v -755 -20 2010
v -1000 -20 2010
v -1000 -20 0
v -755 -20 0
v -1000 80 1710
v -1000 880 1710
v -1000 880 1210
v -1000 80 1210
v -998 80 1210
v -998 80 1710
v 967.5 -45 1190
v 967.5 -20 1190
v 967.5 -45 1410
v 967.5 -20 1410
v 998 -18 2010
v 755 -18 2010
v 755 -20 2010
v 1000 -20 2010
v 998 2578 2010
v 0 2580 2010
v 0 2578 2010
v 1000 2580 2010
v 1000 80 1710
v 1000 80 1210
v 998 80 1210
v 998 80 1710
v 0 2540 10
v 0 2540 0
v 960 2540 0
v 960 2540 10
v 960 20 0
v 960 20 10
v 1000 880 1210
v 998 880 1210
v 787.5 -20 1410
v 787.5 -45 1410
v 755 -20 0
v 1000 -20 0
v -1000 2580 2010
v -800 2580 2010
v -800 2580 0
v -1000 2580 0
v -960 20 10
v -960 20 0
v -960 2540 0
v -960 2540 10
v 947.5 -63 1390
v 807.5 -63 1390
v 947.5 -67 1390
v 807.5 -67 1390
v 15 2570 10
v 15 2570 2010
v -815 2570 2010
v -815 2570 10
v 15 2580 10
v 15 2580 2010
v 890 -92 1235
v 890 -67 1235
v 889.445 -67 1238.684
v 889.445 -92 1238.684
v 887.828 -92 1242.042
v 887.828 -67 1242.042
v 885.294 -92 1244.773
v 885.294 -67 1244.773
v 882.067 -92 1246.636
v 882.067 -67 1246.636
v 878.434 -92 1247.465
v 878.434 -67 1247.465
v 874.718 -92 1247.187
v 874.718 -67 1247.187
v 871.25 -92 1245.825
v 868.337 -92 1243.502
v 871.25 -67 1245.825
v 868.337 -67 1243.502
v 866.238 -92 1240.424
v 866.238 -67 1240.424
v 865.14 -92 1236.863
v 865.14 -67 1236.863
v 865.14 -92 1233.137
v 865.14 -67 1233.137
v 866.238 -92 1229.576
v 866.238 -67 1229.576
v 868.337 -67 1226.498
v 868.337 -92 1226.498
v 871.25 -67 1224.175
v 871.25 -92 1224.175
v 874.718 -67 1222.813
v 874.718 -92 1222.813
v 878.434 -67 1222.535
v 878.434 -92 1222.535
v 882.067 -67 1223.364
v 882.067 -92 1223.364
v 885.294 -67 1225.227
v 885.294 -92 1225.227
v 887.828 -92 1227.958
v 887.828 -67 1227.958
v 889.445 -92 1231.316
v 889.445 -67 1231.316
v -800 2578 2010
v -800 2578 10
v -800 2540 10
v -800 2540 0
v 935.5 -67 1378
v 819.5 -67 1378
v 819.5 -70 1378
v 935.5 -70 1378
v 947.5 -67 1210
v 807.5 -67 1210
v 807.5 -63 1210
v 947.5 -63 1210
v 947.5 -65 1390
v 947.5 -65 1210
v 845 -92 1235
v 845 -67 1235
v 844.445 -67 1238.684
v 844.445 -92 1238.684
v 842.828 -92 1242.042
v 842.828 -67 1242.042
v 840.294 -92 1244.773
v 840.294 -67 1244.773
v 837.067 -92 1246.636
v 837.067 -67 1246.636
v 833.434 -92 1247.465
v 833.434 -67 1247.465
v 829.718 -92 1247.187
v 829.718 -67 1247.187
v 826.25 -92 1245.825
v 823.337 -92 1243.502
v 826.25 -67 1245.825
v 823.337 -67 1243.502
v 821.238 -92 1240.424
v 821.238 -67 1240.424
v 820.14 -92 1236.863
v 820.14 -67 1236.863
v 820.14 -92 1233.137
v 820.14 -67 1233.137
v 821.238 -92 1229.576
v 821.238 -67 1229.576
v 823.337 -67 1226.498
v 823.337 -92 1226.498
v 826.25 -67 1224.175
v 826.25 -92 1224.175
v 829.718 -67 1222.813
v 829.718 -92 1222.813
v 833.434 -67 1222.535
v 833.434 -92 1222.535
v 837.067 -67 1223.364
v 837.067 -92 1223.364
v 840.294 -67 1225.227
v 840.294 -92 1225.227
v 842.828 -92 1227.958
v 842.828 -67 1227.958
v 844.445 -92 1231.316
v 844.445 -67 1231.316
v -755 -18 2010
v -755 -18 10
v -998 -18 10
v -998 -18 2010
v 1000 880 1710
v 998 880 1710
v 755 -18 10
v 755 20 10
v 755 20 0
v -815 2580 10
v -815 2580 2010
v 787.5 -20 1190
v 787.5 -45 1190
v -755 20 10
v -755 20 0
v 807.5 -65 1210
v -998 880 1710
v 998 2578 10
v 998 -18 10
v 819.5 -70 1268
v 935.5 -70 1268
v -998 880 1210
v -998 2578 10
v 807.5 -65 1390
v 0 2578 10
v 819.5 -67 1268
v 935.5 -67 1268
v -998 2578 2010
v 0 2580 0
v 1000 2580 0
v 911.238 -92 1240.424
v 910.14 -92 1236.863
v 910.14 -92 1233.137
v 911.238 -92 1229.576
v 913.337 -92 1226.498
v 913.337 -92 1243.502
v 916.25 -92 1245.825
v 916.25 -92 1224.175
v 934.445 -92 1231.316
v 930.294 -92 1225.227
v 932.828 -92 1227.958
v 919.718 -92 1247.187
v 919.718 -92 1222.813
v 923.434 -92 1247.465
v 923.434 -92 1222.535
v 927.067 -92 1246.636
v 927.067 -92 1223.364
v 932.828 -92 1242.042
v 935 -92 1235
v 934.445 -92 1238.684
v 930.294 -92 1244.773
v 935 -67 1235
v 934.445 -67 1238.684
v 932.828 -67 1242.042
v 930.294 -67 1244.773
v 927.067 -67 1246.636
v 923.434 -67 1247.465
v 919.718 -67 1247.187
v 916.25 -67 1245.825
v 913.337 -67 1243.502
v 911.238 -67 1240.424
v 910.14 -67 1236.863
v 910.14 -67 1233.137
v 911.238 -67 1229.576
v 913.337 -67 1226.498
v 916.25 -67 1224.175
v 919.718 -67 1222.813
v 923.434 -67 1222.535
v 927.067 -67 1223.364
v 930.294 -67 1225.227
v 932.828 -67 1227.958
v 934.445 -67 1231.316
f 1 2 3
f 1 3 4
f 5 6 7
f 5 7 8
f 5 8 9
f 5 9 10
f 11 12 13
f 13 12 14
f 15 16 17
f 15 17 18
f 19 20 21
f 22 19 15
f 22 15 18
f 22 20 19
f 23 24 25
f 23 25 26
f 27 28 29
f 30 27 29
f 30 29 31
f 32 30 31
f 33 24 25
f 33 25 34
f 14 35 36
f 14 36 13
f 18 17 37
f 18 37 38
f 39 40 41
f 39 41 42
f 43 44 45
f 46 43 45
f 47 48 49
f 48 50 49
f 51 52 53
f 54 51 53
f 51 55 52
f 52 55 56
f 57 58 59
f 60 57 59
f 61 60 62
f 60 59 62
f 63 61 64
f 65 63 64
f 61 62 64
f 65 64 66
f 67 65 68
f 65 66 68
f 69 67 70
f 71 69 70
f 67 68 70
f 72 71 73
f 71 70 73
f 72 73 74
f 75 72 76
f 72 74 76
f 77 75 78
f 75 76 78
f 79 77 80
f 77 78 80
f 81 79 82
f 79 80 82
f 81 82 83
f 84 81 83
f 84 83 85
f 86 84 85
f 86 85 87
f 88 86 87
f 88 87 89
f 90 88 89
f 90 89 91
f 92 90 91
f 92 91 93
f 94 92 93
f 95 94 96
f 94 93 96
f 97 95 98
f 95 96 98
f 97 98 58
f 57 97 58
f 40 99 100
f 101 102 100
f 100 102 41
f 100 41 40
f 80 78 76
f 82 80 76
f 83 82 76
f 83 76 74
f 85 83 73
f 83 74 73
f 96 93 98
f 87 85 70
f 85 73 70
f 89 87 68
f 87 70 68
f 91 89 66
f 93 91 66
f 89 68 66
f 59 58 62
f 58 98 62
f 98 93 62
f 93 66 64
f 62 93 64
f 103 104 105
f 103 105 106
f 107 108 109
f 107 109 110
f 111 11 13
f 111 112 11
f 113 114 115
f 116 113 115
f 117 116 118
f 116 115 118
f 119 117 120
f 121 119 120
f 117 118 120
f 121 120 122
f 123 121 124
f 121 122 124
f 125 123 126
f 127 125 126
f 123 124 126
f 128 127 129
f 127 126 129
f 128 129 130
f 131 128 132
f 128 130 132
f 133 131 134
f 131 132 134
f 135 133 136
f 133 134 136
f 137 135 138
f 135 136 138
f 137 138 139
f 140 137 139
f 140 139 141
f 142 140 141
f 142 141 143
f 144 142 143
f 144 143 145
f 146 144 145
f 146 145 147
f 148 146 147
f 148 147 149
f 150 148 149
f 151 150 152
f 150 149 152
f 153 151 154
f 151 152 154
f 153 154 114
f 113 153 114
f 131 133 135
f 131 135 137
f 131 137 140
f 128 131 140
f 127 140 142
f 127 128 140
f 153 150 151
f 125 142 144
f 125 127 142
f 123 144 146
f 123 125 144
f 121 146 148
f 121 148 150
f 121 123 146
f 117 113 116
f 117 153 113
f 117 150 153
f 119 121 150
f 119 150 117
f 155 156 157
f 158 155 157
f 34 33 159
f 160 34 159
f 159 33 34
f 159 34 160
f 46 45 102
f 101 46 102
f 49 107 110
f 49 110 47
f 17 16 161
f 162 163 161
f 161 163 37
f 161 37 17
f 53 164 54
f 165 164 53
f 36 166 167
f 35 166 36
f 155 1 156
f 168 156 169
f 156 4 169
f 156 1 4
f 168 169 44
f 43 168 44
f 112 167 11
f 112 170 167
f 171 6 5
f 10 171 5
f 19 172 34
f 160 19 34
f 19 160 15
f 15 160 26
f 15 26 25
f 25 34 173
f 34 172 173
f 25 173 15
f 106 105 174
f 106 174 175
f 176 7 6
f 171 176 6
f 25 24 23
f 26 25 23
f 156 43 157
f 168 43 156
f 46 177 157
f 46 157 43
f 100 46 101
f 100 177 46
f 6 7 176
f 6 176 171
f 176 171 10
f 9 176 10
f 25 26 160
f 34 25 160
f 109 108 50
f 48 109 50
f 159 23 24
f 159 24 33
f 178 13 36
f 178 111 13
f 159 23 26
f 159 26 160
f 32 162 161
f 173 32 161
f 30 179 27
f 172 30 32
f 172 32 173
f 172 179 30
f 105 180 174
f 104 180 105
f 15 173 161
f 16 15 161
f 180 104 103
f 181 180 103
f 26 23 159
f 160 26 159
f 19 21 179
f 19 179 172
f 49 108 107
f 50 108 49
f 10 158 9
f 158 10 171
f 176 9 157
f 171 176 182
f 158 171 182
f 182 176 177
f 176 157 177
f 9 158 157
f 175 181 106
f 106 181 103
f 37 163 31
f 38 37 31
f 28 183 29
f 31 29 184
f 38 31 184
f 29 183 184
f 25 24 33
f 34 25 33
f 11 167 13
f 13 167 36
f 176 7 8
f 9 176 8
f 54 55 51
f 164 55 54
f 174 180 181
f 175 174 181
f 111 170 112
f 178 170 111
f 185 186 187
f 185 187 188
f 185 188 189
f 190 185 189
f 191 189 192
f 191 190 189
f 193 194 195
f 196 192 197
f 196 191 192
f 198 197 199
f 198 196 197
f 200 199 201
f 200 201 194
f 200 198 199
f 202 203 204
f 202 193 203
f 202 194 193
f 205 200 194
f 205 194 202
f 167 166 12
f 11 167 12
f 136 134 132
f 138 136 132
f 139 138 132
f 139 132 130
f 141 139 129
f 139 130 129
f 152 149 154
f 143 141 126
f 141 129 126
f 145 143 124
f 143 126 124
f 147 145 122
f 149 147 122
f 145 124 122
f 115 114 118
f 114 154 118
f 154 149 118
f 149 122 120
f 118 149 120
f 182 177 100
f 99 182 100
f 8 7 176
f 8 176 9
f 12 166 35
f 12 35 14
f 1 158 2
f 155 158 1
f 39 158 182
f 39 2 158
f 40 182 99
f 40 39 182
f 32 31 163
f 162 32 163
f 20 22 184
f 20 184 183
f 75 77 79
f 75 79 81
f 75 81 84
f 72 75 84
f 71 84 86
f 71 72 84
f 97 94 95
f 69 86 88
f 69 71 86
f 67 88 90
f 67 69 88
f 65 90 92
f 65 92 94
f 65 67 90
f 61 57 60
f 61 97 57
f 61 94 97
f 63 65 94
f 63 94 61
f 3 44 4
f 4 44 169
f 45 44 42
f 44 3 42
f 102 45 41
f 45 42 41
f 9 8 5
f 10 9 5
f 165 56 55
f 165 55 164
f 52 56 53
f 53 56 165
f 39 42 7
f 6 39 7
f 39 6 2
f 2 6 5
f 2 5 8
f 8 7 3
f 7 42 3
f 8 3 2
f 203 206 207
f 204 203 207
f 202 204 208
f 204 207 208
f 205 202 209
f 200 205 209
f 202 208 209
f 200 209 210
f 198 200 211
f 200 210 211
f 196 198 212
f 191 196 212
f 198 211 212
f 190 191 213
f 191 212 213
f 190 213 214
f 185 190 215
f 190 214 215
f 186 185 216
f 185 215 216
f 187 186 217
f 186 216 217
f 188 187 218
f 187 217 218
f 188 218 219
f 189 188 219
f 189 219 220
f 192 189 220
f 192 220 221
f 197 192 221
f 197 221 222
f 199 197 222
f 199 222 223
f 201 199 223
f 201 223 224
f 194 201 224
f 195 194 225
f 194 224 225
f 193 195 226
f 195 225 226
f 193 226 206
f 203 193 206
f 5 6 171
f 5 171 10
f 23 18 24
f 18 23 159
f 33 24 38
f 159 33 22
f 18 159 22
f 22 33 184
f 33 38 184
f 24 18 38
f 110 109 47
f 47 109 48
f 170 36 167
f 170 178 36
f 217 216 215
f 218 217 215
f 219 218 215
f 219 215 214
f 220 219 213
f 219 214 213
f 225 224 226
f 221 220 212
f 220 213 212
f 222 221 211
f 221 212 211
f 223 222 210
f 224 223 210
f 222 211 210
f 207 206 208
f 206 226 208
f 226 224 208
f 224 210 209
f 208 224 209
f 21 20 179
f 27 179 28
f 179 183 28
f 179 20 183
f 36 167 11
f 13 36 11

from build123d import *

# Parameters (mm, degrees)
F1_DEPTH   = 10
F3_DEPTH   = 2000
F5_DEPTH   = 2000
F6_W       = 830
F6_H       = 2000
F7_DEPTH   = 10
F8_W       = 800
F8_H       = 500
F9_DEPTH   = 5
F10_W      = 800
F10_H      = 500
F11_DEPTH  = 5
F12_W      = 800
F12_H      = 500
F13_DEPTH  = 2
F14_W      = 800
F14_H      = 500
F15_DEPTH  = 2
F17_W      = 180
F17_H      = 220
F18_DEPTH  = 25
F18_FACE_W = 180
F18_FACE_H = 220
F20_W      = 140
F20_H      = 180
F22_DEPTH  = 2
F23_R      = 12.5
F24_DEPTH  = 25
F25_W      = 116
F25_H      = 110
F26_DEPTH  = 3


with BuildPart() as f1:
    # F0 (on Top) → F1 (new body)
    with BuildSketch(Plane.XY):
        Polygon((-755, -20), (-755, 0), (-755, 20), (-960, 20), (-960, 2540), (-800, 2540), (-800, 2580), (-1000, 2580), (-1000, 2540), (-1000, 20), (-1000, 0), (-1000, -20), align=None)
    extrude(amount=F1_DEPTH)

    # F2 (on face) → F3 (join)
    with BuildSketch(Plane.XY.offset(10)):
        Polygon((-800, 2578), (-800, 2580), (-1000, 2580), (-1000, -20), (-755, -20), (-755, -18), (-998, -18), (-998, 2578), align=None)
    extrude(amount=F3_DEPTH)

    # F10 (on face) → F11 (cut)
    with BuildSketch(Plane(origin=(-1000, 0, 0), x_dir=(0, -1, 0), z_dir=(-1, 0, 0))):
        with Locations((-480, 1460)):
            Rectangle(F10_W, F10_H)
    extrude(amount=-F11_DEPTH, mode=Mode.SUBTRACT)


with BuildPart() as f1b:
    # F0 (on Top) → F1, piece 2 (new body)
    with BuildSketch(Plane.XY):
        Polygon((755, 20), (755, 0), (755, -20), (1000, -20), (1000, 0), (1000, 20), (1000, 2540), (1000, 2580), (0, 2580), (0, 2540), (960, 2540), (960, 20), align=None)
    extrude(amount=F1_DEPTH)

    # F4 (on face) → F5 (join)
    with BuildSketch(Plane.XY.offset(10)):
        Polygon((1000, 2580), (0, 2580), (0, 2578), (998, 2578), (998, -18), (755, -18), (755, -20), (1000, -20), align=None)
    extrude(amount=F5_DEPTH)

    # F8 (on face) → F9 (cut)
    with BuildSketch(Plane.YZ.offset(1000)):
        with Locations((480, 1460)):
            Rectangle(F8_W, F8_H)
    extrude(amount=-F9_DEPTH, mode=Mode.SUBTRACT)


with BuildPart() as f7:
    # F6 (on face) → F7 (new body)
    with BuildSketch(Plane(origin=(0, 2580, 0), x_dir=(-1, 0, 0), z_dir=(0, 1, 0))):
        with Locations((400, 1010)):
            Rectangle(F6_W, F6_H)
    extrude(amount=-F7_DEPTH)


with BuildPart() as f13:
    # F12 (on face) → F13 (new body)
    with BuildSketch(Plane(origin=(-1000, 0, 0), x_dir=(0, -1, 0), z_dir=(-1, 0, 0))):
        with Locations((-480, 1460)):
            Rectangle(F12_W, F12_H)
    extrude(amount=-F13_DEPTH)


with BuildPart() as f15:
    # F14 (on face) → F15 (new body)
    with BuildSketch(Plane.YZ.offset(1000)):
        with Locations((480, 1460)):
            Rectangle(F14_W, F14_H)
    extrude(amount=-F15_DEPTH)


with BuildPart() as f18:
    # F17 (on face) → F18 (new body)
    with BuildSketch(Plane.XZ.offset(20)):
        with Locations((877.5, 1300)):
            Rectangle(F17_W, F17_H)
    extrude(amount=F18_DEPTH)


with BuildPart() as f21:
    # F18_face (on face) → F21 section 0
    with BuildSketch(Plane(origin=(877.5, -45, 1300), x_dir=(1, 0, 0), z_dir=(0, -1, 0))):
        Rectangle(F18_FACE_W, F18_FACE_H)
    # F20 (on offset) → F21 section 1
    with BuildSketch(Plane.XZ.offset(65)):
        with Locations((877.5, 1300)):
            Rectangle(F20_W, F20_H)
    loft()


with BuildPart() as f22:
    # F22 (new, symmetric): a face of the model
    f22_faces = [f21.part.faces().sort_by_distance(p)[0] for p in [
        (877.5, -65, 1300),
    ]]
    extrude(f22_faces, amount=F22_DEPTH, both=True)


with BuildPart() as f24:
    # F23 (on face) → F24 (new body)
    with BuildSketch(Plane.XZ.offset(67)):
        with Locations((877.5, 1235)):
            Circle(F23_R)
    extrude(amount=F24_DEPTH)


with BuildPart() as f24b:
    # F23 (on face) → F24, piece 2 (new body)
    with BuildSketch(Plane.XZ.offset(67)):
        with Locations((832.5, 1235)):
            Circle(F23_R)
    extrude(amount=F24_DEPTH)


with BuildPart() as f24c:
    # F23 (on face) → F24, piece 3 (new body)
    with BuildSketch(Plane.XZ.offset(67)):
        with Locations((922.5, 1235)):
            Circle(F23_R)
    extrude(amount=F24_DEPTH)


with BuildPart() as f26:
    # F25 (on face) → F26 (new body)
    with BuildSketch(Plane.XZ.offset(67)):
        with Locations((877.5, 1323)):
            Rectangle(F25_W, F25_H)
    extrude(amount=F26_DEPTH)


solid = Compound([f1.part, f1b.part, f7.part, f13.part, f15.part, f18.part, f21.part, f22.part, f24.part, f24b.part, f24c.part, f26.part])
